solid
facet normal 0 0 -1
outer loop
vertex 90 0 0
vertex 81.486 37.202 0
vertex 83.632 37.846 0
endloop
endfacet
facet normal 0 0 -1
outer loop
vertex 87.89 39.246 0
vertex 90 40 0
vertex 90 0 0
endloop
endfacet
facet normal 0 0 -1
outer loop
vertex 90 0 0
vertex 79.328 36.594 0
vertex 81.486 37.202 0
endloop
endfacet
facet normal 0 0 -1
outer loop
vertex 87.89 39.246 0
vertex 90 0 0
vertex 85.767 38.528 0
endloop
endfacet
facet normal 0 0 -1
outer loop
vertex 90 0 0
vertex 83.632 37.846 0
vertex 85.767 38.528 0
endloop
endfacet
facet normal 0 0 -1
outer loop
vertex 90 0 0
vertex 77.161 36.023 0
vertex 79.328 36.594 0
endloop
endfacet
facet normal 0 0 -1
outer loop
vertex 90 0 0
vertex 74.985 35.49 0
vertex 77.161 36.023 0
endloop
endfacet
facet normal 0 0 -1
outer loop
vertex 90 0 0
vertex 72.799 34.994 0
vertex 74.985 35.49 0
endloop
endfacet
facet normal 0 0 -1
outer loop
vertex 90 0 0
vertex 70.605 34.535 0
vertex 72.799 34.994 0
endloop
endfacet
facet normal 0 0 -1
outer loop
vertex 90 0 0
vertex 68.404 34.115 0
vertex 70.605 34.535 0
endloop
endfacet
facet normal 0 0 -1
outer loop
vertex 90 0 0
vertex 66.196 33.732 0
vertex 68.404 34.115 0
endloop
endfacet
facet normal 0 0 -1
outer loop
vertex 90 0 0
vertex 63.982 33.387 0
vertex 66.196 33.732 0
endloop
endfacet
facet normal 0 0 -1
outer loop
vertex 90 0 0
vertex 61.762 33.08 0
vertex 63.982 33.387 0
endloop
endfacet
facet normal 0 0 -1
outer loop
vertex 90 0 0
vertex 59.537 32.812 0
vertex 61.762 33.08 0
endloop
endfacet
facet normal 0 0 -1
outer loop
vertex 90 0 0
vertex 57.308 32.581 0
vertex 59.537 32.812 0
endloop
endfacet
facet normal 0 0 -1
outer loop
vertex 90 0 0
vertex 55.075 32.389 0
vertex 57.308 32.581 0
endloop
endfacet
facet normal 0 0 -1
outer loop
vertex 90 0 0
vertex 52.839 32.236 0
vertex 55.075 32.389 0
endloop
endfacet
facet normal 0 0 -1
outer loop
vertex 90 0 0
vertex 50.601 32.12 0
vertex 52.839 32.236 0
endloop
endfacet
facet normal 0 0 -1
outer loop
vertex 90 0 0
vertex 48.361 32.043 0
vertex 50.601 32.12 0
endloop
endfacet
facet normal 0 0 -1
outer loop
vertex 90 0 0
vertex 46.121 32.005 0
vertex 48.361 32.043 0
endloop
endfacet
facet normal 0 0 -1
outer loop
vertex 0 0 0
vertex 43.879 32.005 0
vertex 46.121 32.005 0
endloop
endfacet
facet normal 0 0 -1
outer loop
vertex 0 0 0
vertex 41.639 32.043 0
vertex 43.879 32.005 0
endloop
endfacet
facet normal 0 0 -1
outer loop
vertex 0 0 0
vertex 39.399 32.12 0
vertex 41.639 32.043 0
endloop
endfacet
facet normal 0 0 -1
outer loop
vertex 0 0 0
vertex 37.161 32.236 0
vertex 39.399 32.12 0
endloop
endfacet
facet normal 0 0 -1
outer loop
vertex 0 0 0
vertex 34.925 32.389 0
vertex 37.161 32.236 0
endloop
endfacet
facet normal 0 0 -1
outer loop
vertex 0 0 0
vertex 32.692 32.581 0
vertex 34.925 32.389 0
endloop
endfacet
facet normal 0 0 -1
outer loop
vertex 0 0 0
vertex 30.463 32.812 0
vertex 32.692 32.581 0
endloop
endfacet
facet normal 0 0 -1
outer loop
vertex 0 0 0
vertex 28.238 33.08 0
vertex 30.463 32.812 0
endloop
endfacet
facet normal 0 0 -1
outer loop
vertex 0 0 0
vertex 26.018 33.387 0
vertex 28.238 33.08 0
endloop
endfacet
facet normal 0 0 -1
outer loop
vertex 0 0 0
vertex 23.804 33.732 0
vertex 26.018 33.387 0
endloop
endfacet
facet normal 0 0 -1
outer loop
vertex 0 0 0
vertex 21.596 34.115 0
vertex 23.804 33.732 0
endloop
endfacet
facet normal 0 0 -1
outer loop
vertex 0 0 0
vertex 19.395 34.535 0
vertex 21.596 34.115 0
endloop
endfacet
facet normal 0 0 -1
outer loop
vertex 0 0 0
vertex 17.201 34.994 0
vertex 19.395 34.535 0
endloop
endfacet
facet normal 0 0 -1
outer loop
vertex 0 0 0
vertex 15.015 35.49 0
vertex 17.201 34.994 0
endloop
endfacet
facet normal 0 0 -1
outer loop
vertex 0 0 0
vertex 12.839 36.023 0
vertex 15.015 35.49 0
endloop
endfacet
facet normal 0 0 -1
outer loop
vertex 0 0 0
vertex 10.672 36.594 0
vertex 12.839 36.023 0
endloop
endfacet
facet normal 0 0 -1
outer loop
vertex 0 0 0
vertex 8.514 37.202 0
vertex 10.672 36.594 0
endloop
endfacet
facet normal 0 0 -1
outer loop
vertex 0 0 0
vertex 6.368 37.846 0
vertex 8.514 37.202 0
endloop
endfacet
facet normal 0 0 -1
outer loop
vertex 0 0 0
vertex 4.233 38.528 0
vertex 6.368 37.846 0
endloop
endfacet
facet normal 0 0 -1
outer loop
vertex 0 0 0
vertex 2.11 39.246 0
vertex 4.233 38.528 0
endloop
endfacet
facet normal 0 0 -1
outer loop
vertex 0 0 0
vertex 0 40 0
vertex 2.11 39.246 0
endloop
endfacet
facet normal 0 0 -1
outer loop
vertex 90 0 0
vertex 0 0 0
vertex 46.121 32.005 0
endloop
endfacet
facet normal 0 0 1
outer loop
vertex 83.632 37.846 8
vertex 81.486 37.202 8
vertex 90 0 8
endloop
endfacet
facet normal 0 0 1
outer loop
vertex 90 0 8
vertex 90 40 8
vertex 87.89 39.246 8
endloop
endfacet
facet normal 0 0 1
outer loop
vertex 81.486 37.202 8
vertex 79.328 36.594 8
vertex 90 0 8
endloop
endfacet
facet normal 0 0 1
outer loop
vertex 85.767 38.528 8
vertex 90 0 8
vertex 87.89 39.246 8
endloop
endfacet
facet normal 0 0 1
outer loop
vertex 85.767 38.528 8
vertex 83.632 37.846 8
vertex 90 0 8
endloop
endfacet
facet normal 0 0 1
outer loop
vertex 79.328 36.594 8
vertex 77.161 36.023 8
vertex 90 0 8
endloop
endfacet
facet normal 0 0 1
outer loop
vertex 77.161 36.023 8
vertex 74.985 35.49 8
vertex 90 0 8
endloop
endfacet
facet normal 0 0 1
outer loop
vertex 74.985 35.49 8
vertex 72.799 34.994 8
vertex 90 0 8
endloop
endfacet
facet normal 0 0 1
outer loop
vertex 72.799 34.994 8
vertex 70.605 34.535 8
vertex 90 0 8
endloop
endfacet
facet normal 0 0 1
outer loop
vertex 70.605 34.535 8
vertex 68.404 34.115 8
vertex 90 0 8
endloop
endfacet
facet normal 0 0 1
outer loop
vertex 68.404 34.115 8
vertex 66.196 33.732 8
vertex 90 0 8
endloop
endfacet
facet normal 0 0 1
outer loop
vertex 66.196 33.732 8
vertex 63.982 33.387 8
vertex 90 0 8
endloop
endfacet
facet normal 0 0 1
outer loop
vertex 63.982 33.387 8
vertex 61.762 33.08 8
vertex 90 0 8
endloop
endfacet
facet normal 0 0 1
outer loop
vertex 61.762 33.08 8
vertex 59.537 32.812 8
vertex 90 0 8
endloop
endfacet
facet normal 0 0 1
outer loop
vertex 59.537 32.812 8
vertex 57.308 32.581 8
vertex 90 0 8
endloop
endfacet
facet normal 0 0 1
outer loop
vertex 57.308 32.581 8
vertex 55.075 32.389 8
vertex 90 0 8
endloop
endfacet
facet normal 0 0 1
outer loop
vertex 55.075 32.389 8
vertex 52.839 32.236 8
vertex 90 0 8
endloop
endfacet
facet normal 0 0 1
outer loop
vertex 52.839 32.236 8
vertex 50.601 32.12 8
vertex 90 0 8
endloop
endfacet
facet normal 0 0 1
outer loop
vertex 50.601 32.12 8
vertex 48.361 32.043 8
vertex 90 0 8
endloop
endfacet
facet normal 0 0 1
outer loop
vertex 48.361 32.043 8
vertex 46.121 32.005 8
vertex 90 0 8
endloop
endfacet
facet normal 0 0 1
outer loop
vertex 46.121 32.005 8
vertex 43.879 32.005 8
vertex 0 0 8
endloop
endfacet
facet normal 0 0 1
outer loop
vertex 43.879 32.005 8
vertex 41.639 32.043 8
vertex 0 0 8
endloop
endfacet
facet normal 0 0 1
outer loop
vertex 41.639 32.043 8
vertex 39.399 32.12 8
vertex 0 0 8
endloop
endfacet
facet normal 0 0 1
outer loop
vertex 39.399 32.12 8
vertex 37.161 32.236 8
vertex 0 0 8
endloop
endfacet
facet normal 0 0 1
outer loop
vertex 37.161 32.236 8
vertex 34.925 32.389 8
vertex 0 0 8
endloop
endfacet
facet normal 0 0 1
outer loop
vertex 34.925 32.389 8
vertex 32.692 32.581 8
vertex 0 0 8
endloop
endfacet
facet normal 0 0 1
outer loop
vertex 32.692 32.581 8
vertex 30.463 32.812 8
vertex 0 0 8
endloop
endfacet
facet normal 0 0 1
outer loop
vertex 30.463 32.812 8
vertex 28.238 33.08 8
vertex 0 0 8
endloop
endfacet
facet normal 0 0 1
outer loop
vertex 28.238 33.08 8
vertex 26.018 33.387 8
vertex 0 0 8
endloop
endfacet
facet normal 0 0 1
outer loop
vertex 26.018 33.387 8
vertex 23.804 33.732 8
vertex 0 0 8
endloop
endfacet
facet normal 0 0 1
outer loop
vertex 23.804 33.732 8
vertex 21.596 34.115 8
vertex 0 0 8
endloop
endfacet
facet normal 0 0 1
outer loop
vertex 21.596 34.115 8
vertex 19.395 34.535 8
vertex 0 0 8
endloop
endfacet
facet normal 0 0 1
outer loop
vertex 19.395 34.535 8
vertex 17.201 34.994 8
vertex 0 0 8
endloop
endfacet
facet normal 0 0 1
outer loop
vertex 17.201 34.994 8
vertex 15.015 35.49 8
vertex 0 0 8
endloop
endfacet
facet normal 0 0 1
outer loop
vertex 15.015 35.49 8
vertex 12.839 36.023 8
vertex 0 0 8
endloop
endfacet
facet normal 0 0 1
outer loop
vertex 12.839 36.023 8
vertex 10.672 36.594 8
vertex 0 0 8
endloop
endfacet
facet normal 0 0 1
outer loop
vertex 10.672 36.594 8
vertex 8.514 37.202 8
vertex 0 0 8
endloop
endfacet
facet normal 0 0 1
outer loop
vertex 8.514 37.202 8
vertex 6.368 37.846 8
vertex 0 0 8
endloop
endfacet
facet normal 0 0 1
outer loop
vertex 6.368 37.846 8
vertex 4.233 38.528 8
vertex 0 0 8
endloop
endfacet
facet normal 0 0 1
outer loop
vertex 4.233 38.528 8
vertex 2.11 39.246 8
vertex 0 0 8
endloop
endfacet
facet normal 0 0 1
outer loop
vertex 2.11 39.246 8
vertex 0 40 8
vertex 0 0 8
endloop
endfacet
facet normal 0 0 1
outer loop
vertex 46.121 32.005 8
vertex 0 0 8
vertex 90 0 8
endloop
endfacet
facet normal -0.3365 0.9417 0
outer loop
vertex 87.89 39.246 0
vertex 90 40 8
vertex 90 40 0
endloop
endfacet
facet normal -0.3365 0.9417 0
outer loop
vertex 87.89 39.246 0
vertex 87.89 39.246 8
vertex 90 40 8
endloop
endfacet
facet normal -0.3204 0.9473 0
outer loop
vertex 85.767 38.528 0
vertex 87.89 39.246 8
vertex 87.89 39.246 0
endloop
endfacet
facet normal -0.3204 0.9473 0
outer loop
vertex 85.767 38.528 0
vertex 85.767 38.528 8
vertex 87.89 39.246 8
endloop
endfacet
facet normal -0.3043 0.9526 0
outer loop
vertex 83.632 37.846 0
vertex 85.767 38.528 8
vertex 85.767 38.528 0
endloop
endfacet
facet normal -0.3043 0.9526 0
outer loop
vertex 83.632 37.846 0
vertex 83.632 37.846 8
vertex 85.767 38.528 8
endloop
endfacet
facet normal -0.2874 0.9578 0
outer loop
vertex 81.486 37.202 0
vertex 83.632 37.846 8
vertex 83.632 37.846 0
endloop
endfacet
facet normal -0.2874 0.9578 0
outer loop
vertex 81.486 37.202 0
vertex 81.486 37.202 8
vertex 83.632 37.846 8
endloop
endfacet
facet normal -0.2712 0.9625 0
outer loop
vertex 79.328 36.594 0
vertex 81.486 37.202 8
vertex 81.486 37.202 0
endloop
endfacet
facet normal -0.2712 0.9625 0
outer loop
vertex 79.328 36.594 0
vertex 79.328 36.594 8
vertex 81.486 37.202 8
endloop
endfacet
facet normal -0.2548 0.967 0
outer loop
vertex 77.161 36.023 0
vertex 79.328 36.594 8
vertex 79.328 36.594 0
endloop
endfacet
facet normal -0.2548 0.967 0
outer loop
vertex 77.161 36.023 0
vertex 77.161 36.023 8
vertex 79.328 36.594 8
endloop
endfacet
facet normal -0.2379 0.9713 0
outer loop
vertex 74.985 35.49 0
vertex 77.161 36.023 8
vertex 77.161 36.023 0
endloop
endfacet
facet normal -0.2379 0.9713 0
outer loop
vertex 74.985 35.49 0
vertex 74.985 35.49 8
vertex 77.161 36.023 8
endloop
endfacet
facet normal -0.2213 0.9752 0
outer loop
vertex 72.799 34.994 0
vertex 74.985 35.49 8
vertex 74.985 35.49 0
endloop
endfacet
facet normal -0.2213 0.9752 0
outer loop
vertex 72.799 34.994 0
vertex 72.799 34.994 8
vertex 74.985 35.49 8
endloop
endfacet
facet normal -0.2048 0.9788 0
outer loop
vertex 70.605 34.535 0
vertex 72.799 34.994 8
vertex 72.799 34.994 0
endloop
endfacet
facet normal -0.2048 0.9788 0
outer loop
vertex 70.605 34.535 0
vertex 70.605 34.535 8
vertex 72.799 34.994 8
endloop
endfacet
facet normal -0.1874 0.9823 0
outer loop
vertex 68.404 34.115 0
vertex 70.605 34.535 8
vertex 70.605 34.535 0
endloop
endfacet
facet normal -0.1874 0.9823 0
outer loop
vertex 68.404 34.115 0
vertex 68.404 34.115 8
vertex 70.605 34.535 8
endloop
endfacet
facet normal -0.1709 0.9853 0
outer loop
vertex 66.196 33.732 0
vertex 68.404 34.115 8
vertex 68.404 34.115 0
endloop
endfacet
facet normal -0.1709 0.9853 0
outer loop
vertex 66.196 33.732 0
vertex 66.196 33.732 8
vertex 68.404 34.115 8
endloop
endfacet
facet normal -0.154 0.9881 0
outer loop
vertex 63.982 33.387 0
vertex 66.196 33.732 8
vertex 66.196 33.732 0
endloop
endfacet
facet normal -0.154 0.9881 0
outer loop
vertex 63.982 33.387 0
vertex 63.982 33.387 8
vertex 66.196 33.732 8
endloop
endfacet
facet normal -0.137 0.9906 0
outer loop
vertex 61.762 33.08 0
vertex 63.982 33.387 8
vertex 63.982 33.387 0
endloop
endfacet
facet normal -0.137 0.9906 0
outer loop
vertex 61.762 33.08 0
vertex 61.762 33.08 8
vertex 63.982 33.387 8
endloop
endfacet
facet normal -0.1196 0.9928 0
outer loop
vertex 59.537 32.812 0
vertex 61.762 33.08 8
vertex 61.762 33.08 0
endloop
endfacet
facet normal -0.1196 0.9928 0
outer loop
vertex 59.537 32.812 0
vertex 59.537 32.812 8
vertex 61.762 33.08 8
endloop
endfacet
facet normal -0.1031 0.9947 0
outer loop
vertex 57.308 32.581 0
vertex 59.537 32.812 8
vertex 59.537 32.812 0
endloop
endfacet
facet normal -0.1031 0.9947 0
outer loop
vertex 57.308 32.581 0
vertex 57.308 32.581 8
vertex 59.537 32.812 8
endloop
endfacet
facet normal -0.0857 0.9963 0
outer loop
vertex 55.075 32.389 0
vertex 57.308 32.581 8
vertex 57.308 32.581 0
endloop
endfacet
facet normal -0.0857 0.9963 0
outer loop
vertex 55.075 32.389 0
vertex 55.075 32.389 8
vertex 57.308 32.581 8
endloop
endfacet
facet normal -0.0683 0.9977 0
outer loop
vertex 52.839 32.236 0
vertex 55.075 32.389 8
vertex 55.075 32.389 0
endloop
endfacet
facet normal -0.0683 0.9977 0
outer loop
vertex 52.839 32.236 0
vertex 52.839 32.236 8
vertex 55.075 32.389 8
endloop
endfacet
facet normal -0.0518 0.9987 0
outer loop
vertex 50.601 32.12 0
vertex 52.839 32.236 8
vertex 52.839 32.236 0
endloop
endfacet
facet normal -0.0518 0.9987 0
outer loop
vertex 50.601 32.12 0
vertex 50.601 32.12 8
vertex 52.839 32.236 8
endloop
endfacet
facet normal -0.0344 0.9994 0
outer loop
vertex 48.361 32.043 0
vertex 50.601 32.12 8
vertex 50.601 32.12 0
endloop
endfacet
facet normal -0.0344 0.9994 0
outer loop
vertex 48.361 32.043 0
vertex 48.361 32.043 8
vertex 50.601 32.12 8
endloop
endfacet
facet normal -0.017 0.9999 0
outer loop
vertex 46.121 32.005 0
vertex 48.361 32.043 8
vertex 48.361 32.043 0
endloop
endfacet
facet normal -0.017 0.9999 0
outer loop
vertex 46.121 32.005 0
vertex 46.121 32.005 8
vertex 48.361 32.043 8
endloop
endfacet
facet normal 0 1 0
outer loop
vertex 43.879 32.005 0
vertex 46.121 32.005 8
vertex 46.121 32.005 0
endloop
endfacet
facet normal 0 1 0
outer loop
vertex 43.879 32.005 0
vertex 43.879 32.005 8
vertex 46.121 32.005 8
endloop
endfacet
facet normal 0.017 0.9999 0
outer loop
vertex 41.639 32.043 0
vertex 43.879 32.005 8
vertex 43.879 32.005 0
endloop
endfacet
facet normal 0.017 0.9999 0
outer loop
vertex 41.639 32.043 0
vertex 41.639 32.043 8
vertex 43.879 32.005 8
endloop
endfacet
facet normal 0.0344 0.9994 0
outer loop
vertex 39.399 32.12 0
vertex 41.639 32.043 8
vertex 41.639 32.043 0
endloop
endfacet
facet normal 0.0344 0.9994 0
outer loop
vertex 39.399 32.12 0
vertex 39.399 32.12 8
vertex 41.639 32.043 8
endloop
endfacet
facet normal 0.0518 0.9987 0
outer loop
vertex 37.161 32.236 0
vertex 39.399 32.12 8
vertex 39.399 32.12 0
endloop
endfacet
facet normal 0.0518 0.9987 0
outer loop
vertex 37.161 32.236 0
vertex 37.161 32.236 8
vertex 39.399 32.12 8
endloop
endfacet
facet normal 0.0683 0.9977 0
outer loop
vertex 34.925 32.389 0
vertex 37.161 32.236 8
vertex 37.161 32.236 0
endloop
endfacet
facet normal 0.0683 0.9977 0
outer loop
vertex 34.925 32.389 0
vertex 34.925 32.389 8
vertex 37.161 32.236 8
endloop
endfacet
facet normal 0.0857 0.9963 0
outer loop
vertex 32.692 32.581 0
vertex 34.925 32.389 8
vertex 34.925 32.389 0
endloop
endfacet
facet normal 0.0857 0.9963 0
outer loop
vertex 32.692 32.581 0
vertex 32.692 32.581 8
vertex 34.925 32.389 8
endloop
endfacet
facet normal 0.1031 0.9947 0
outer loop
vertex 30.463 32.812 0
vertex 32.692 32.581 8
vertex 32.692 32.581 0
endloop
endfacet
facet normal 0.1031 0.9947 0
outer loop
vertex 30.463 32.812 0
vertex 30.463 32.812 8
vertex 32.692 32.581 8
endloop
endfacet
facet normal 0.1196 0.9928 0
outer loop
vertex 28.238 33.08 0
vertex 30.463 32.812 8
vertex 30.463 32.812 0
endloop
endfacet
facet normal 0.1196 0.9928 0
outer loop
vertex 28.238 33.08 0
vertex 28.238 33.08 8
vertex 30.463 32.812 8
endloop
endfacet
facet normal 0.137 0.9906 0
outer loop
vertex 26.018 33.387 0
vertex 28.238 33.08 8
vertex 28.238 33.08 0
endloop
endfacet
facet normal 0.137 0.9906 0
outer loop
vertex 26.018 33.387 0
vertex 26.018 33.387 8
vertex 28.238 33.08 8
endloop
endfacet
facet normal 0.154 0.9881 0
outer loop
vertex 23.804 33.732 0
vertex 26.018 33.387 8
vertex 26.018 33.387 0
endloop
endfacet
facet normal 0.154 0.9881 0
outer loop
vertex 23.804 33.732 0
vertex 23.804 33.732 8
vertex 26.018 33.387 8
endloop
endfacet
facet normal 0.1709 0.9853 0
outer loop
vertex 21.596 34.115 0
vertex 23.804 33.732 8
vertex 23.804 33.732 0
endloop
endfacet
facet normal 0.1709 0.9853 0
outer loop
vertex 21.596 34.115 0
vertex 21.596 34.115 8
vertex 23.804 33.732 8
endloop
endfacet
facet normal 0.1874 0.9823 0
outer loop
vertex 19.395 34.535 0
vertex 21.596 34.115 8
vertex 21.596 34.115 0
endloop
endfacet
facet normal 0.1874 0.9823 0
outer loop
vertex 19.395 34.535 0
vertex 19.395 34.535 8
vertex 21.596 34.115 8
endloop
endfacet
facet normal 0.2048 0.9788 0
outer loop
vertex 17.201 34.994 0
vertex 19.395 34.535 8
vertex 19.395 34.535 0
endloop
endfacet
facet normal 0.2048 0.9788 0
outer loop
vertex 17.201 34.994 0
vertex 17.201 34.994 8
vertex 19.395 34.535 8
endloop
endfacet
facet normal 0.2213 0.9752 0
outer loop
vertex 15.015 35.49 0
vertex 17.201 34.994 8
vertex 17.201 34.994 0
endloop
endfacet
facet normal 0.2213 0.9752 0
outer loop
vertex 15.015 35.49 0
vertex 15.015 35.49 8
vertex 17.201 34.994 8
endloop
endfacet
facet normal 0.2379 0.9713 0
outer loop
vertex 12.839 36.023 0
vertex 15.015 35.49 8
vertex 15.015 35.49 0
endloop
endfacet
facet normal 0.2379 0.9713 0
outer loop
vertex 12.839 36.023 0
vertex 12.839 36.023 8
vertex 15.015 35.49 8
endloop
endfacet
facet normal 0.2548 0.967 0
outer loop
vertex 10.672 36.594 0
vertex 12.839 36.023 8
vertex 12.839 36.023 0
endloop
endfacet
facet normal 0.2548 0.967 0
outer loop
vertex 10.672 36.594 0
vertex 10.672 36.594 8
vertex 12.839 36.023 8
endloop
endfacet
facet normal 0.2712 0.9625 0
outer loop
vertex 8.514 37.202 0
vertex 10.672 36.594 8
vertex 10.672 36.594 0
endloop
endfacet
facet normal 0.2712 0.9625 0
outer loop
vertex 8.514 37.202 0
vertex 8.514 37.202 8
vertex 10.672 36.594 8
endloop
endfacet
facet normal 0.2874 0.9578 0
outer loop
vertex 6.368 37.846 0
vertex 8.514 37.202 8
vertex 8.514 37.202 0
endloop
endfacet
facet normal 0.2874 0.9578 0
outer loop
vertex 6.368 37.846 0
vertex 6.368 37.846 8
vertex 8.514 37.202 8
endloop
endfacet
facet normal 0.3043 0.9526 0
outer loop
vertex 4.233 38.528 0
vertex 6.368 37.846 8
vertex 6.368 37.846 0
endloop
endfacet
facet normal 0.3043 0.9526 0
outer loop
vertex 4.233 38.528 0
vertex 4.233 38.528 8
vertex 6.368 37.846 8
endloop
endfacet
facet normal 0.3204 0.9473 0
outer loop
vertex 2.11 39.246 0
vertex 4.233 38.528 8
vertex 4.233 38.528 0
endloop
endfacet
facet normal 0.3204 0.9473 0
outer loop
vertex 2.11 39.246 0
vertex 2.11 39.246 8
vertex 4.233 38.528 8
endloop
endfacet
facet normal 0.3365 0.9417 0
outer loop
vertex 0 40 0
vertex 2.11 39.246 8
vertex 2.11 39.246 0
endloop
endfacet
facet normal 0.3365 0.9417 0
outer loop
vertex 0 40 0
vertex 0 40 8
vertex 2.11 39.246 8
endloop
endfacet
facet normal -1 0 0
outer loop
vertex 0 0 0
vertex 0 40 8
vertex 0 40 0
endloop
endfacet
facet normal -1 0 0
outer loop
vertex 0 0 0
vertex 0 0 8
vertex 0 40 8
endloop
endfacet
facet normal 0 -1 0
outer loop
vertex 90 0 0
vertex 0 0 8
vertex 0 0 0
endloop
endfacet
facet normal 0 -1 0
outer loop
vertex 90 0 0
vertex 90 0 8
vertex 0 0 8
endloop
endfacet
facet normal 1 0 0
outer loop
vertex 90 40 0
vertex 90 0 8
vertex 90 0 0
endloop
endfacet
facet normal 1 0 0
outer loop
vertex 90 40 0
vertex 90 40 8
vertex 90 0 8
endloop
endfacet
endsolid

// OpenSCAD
$fn = 32;

// ----------------------------------------------------------------------
// Arc profile plate: notch, 44 points
// ----------------------------------------------------------------------

// --- parameters (mm) ---
bar_l = 90;               // bar length, X
bar_w = 40;               // bar width, Y
notch_depth = 8;          // depth of the arc notch at mid-span
arc_r = 130.56;           // radius of the notch arc
arc_angle = 40.32;        // notch arc angle, degrees
arc_step = 1;             // sampling step of the notch arc, degrees
plate_t = 8;              // plate thickness, Z

profile = [[0, 0], [90, 0], [90, 40], [87.89, 39.246], [85.767, 38.528], [83.632, 37.846], [81.486, 37.202], [79.328, 36.594], [77.161, 36.023], [74.985, 35.49], [72.799, 34.994], [70.605, 34.535], [68.404, 34.115], [66.196, 33.732], [63.982, 33.387], [61.762, 33.08], [59.537, 32.812], [57.308, 32.581], [55.075, 32.389], [52.839, 32.236], [50.601, 32.12], [48.361, 32.043], [46.121, 32.005], [43.879, 32.005], [41.639, 32.043], [39.399, 32.12], [37.161, 32.236], [34.925, 32.389], [32.692, 32.581], [30.463, 32.812], [28.238, 33.08], [26.018, 33.387], [23.804, 33.732], [21.596, 34.115], [19.395, 34.535], [17.201, 34.994], [15.015, 35.49], [12.839, 36.023], [10.672, 36.594], [8.514, 37.202], [6.368, 37.846], [4.233, 38.528], [2.11, 39.246], [0, 40]];  // primary outline, 44 points, counter clockwise

// --- the one profile operation ---
linear_extrude(height = plate_t) polygon(points = profile);
